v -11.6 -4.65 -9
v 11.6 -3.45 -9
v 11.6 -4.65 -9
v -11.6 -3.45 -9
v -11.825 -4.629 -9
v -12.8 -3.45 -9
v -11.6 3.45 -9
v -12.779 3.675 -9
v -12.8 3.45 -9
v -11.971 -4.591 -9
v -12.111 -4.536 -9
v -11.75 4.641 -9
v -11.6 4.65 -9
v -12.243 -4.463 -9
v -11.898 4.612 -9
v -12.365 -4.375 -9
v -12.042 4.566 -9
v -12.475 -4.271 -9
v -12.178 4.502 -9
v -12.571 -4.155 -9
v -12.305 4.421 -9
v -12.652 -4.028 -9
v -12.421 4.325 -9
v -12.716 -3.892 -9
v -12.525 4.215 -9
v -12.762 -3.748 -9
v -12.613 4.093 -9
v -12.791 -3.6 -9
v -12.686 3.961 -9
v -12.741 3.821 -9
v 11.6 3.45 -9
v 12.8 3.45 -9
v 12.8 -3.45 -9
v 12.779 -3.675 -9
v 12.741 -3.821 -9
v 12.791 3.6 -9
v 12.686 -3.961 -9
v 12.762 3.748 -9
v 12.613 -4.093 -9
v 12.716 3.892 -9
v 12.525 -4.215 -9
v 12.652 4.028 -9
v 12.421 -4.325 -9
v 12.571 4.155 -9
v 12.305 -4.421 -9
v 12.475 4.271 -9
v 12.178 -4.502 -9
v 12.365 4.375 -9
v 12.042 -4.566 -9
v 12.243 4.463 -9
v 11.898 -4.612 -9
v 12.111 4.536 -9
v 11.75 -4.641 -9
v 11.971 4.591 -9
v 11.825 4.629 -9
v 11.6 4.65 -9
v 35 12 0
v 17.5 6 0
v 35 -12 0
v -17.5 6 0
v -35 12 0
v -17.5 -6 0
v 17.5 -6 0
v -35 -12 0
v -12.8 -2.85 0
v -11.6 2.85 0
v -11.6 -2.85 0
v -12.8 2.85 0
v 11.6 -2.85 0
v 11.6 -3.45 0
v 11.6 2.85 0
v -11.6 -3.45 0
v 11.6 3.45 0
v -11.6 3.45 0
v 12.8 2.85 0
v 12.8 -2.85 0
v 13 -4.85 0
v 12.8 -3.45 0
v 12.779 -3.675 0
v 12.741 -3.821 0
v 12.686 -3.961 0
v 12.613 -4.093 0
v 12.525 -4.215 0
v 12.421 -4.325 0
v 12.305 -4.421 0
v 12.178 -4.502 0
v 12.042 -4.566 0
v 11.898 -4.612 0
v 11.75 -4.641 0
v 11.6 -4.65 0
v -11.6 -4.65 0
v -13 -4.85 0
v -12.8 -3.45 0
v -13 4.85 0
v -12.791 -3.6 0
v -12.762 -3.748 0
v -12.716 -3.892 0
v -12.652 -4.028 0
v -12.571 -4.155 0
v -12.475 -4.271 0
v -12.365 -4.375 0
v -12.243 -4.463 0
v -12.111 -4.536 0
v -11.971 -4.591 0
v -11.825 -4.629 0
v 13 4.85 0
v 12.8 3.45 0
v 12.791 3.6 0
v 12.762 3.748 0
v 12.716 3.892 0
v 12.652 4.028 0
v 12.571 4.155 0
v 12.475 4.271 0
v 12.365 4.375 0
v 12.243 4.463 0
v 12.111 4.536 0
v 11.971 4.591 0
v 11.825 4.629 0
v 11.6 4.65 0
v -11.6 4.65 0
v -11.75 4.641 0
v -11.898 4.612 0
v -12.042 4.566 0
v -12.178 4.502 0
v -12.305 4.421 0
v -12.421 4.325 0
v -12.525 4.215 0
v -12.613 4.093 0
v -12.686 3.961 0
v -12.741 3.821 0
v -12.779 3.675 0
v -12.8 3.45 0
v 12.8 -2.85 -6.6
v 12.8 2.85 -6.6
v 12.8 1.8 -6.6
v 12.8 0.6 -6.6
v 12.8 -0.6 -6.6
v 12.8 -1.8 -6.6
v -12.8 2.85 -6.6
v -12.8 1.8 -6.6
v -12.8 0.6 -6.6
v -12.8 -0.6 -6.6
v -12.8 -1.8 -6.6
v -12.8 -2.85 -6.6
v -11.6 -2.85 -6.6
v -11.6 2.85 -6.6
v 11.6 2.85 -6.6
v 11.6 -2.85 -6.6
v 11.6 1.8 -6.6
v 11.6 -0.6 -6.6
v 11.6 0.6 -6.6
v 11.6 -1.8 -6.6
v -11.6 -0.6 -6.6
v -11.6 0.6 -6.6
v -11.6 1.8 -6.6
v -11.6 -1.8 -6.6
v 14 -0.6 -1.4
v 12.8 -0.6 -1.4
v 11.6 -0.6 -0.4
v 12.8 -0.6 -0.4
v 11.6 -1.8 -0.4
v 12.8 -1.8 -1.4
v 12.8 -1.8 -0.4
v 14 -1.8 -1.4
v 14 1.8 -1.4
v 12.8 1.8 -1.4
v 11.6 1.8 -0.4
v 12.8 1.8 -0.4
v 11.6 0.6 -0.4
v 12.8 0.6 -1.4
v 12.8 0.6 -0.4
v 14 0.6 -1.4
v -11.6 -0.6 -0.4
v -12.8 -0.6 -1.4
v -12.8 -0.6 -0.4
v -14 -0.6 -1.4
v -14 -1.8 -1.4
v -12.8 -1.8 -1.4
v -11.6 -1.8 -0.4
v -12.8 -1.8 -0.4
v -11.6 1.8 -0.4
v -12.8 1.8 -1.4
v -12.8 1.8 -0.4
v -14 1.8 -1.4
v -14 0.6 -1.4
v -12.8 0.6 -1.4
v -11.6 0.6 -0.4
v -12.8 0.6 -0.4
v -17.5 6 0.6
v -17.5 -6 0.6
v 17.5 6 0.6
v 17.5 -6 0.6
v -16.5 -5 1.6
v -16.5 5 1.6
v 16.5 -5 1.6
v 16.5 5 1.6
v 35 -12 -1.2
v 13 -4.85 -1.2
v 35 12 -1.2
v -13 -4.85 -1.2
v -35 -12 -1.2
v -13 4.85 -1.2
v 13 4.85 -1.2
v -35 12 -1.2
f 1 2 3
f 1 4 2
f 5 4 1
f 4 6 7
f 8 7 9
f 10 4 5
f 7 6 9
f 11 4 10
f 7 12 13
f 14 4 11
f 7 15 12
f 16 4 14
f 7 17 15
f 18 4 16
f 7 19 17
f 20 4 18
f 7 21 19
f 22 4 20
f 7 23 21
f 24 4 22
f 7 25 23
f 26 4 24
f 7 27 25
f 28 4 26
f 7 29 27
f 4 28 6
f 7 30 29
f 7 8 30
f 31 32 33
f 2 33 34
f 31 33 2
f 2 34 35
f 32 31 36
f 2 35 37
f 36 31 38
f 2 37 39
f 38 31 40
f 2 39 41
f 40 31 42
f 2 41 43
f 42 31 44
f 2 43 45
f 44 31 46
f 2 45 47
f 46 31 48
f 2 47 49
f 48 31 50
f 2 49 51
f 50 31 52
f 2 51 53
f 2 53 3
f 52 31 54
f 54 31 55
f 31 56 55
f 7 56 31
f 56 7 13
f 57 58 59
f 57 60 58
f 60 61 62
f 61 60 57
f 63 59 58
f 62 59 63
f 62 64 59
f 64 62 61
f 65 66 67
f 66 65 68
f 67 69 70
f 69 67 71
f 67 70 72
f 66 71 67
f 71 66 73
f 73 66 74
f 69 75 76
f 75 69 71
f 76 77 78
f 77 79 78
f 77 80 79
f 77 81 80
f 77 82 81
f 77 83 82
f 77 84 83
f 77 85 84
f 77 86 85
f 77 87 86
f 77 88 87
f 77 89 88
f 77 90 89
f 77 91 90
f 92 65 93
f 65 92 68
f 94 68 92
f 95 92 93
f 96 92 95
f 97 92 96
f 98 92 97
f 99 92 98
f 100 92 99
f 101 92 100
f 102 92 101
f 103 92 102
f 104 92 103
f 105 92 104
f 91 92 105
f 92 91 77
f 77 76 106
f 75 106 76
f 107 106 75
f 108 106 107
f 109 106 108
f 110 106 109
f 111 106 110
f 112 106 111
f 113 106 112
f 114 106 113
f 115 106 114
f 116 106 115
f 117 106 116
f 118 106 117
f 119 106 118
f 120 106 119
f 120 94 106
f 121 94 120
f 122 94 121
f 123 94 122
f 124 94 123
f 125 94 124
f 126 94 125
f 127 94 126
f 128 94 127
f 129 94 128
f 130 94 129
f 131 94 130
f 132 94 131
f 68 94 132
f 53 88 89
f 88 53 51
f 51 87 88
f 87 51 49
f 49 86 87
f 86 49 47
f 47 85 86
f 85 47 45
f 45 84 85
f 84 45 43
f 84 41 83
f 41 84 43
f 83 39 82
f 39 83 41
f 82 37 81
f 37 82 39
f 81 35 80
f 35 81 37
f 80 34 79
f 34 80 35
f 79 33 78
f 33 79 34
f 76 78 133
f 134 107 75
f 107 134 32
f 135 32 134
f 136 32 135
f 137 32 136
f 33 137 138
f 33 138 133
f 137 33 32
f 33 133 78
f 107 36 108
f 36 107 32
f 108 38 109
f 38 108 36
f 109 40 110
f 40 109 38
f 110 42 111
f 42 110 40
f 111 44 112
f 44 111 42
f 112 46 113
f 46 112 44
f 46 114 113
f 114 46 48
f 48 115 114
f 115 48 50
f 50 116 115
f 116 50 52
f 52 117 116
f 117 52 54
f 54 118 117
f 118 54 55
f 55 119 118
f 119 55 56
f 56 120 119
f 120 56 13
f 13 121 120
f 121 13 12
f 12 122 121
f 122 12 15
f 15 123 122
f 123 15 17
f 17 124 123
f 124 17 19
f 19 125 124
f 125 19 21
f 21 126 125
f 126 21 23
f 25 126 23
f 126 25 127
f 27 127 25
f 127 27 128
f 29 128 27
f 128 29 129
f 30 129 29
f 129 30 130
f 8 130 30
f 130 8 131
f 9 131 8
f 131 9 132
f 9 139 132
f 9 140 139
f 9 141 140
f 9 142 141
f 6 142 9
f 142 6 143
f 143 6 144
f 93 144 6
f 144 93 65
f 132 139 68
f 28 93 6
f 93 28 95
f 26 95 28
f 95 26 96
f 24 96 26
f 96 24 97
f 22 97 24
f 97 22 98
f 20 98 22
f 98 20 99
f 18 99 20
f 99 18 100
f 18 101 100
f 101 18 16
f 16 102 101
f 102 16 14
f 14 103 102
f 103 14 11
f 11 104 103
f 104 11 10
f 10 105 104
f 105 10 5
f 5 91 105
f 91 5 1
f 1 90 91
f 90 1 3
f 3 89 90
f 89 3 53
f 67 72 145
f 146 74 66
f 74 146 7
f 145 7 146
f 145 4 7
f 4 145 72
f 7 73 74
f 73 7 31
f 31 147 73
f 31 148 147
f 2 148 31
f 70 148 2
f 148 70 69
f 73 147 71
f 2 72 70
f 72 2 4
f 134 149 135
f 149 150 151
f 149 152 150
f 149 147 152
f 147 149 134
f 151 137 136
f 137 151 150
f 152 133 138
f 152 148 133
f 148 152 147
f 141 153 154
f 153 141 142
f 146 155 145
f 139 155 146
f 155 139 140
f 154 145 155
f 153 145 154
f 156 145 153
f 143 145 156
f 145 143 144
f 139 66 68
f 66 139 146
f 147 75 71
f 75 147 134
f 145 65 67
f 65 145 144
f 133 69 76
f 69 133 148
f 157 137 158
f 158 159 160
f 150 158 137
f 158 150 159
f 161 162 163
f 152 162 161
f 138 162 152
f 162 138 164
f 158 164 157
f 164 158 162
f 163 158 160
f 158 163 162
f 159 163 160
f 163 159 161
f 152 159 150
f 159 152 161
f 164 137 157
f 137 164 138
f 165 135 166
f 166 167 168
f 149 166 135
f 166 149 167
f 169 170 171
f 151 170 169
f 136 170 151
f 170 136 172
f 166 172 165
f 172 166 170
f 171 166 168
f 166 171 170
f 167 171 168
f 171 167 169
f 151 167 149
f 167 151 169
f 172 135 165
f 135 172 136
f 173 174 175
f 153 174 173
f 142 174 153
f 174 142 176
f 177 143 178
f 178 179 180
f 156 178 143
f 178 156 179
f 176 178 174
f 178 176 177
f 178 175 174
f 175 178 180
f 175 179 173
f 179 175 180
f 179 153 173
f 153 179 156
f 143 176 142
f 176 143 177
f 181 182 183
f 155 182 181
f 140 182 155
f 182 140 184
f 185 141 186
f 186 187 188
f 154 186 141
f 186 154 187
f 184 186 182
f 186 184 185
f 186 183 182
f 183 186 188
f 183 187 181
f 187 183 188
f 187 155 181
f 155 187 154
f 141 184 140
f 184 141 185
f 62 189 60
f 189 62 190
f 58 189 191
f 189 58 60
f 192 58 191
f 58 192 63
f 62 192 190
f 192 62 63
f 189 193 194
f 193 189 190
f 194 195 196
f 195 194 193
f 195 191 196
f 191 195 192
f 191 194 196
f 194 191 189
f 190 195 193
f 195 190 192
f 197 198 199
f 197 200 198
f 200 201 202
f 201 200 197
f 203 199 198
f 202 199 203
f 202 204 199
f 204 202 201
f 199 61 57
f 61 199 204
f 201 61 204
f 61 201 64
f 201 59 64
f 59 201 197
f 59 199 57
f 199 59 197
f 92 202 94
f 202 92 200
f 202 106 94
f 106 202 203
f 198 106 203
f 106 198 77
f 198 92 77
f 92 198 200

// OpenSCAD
/* customizable cap with arrow and text for rectangular openings in Face panels */

/* [Dimensions] */
panelSlotDims=[26,9.7];
panelThck=1.2;
//the Face Dimensions
capFaceDims=[35,12,1.6];
capFaceChamfer=1.0;
//the part that goes into the slot
capPlugHeight=9;
//spacing between cap and slot
capToPanelSpcng=0.2;
//the minimum wall Thickness
minWallThck=1.2;

/* [Text] */
textString="test";
textSize=7;
textFont="Arial";
textStyle="Bold"; //["Regular","Bold","Italic","Light"]
//relative position to the center
textPosRel=0.15; //[-0.5:0.01:0.5]
//layer Thickness off the text
textThck=1;

/* [Arrow] */
arrowDirection="down"; //["left","up","right","down","none"]
arrowSize=[7,3.5];
//relative position to the center
arrowPosRel=-0.4; //[-0.5:0.01:0.5]

/* [Show] */
showPanel=true;
showCap=true;
showFace=true;
showText=true;
showArrow=true;

/* [Colors] */
panelColor="silver";
capColor="darkSlateGrey";
textColor="ivory";
arrowColor="darkRed";

/* [Hidden] */
capBodyDims=[panelSlotDims.x-capToPanelSpcng*2,panelSlotDims.y-capToPanelSpcng*2,capPlugHeight];
fudge=0.1;
$fn=50;

arrowRotDict=[["left", 180],["up", 90],["right",0],["down",-90]];

if (showPanel)
  color(panelColor) panel();

if (showCap)
  color(capColor) capBody();
if (showFace)
  capFace();

module panel(){
  translate([0,0,-panelThck]) linear_extrude(panelThck) difference(){
    square([capFaceDims.x*2,capFaceDims.y*2],true);
    square(panelSlotDims,true);
  }
}

*capBody();
module capBody(){
  difference(){
    translate([0,0,-capPlugHeight]) linear_extrude(capPlugHeight,convexity=3) difference() {
      offset(minWallThck) square([capBodyDims.x-minWallThck*2,capBodyDims.y-minWallThck*2],true);
      square([capBodyDims.x-minWallThck*2,capBodyDims.y-minWallThck*2],true);
    }
    translate([0,0,-capBodyDims.z/2+minWallThck+fudge/2]) 
      cube([capBodyDims.x+fudge,capBodyDims.y-minWallThck*3,capBodyDims.z-minWallThck*2+fudge],true);
  }
  for (mx=[0:1], iy=[-1,1])
   mirror([mx,0,0]) translate([capBodyDims.x/2-minWallThck,iy*minWallThck,-capBodyDims.z+minWallThck*2]) snapHook();
  
  module snapHook(){
    hookDims=[minWallThck*2,minWallThck,capBodyDims.z-minWallThck*2-panelThck-capToPanelSpcng];
    poly=[[0,0],[0,hookDims.z+panelThck-capToPanelSpcng],[minWallThck,hookDims.z+panelThck-capToPanelSpcng],
          [minWallThck,hookDims.z],[hookDims.x,hookDims.z],[minWallThck,0]];
    
    rotate([90,0,0]) translate([0,0,-hookDims.y/2]) linear_extrude(hookDims.y) polygon(poly);
  }
}

*capFace();
module capFace(){
  scaleFac=[1-capFaceChamfer*2/capFaceDims.x,1-capFaceChamfer*2/capFaceDims.y];
  baseThck= (capFaceDims.z>=capFaceChamfer) ? capFaceDims.z-capFaceChamfer : 0;

  color(capColor) difference(){
    union(){
      linear_extrude(baseThck) square([capFaceDims.x,capFaceDims.y],true);
      translate([0,0,baseThck]) linear_extrude(capFaceDims.z-baseThck,scale=scaleFac) 
        square([capFaceDims.x,capFaceDims.y],true);
    }
    //text
    translate([(capFaceDims.x-capFaceChamfer*2)*textPosRel,0,capFaceDims.z-textThck]) 
      linear_extrude(textThck+fudge, convexity=3) 
        text(text=textString,size=textSize,valign="center",halign="center", font=str(textFont,":style=",textStyle));
    //arrow
    translate([(capFaceDims.x-capFaceChamfer*2)*arrowPosRel,0,capFaceDims.z-textThck])
    linear_extrude(textThck+fudge, convexity=3) 
      rotate(arrowRotDict[search([arrowDirection],arrowRotDict)[0]][1]) customArrow(arrowSize);
    
  }
  
  //text
  if (showText)
  color(textColor) translate([(capFaceDims.x-capFaceChamfer*2)*textPosRel,0,capFaceDims.z-textThck]) 
    linear_extrude(textThck) 
      text(text=textString,size=textSize,valign="center",halign="center", font=str(textFont,":style=",textStyle));
  
 //arrow
  if (showArrow)
  color (arrowColor) translate([(capFaceDims.x-capFaceChamfer*2)*arrowPosRel,0,capFaceDims.z-textThck])
    linear_extrude(textThck) 
      rotate(arrowRotDict[search([arrowDirection],arrowRotDict)[0]][1]) customArrow(arrowSize);
}



//custom arrow
*customArrow();
module customArrow(size=[2,1]){
  bodySize=[size.x/2,size.y/2];
  headSize=[size.x/2,size.y];
           
  headPoly=[[0,headSize.y/2],[headSize.x,0],[0,-headSize.y/2]];
  bodyPoly=[[-bodySize.x,bodySize.y/2],[0,bodySize.y/2],[0,-bodySize.y/2],[-bodySize.x,-bodySize.y/2]];
  polygon(headPoly);
  polygon(bodyPoly);
}
